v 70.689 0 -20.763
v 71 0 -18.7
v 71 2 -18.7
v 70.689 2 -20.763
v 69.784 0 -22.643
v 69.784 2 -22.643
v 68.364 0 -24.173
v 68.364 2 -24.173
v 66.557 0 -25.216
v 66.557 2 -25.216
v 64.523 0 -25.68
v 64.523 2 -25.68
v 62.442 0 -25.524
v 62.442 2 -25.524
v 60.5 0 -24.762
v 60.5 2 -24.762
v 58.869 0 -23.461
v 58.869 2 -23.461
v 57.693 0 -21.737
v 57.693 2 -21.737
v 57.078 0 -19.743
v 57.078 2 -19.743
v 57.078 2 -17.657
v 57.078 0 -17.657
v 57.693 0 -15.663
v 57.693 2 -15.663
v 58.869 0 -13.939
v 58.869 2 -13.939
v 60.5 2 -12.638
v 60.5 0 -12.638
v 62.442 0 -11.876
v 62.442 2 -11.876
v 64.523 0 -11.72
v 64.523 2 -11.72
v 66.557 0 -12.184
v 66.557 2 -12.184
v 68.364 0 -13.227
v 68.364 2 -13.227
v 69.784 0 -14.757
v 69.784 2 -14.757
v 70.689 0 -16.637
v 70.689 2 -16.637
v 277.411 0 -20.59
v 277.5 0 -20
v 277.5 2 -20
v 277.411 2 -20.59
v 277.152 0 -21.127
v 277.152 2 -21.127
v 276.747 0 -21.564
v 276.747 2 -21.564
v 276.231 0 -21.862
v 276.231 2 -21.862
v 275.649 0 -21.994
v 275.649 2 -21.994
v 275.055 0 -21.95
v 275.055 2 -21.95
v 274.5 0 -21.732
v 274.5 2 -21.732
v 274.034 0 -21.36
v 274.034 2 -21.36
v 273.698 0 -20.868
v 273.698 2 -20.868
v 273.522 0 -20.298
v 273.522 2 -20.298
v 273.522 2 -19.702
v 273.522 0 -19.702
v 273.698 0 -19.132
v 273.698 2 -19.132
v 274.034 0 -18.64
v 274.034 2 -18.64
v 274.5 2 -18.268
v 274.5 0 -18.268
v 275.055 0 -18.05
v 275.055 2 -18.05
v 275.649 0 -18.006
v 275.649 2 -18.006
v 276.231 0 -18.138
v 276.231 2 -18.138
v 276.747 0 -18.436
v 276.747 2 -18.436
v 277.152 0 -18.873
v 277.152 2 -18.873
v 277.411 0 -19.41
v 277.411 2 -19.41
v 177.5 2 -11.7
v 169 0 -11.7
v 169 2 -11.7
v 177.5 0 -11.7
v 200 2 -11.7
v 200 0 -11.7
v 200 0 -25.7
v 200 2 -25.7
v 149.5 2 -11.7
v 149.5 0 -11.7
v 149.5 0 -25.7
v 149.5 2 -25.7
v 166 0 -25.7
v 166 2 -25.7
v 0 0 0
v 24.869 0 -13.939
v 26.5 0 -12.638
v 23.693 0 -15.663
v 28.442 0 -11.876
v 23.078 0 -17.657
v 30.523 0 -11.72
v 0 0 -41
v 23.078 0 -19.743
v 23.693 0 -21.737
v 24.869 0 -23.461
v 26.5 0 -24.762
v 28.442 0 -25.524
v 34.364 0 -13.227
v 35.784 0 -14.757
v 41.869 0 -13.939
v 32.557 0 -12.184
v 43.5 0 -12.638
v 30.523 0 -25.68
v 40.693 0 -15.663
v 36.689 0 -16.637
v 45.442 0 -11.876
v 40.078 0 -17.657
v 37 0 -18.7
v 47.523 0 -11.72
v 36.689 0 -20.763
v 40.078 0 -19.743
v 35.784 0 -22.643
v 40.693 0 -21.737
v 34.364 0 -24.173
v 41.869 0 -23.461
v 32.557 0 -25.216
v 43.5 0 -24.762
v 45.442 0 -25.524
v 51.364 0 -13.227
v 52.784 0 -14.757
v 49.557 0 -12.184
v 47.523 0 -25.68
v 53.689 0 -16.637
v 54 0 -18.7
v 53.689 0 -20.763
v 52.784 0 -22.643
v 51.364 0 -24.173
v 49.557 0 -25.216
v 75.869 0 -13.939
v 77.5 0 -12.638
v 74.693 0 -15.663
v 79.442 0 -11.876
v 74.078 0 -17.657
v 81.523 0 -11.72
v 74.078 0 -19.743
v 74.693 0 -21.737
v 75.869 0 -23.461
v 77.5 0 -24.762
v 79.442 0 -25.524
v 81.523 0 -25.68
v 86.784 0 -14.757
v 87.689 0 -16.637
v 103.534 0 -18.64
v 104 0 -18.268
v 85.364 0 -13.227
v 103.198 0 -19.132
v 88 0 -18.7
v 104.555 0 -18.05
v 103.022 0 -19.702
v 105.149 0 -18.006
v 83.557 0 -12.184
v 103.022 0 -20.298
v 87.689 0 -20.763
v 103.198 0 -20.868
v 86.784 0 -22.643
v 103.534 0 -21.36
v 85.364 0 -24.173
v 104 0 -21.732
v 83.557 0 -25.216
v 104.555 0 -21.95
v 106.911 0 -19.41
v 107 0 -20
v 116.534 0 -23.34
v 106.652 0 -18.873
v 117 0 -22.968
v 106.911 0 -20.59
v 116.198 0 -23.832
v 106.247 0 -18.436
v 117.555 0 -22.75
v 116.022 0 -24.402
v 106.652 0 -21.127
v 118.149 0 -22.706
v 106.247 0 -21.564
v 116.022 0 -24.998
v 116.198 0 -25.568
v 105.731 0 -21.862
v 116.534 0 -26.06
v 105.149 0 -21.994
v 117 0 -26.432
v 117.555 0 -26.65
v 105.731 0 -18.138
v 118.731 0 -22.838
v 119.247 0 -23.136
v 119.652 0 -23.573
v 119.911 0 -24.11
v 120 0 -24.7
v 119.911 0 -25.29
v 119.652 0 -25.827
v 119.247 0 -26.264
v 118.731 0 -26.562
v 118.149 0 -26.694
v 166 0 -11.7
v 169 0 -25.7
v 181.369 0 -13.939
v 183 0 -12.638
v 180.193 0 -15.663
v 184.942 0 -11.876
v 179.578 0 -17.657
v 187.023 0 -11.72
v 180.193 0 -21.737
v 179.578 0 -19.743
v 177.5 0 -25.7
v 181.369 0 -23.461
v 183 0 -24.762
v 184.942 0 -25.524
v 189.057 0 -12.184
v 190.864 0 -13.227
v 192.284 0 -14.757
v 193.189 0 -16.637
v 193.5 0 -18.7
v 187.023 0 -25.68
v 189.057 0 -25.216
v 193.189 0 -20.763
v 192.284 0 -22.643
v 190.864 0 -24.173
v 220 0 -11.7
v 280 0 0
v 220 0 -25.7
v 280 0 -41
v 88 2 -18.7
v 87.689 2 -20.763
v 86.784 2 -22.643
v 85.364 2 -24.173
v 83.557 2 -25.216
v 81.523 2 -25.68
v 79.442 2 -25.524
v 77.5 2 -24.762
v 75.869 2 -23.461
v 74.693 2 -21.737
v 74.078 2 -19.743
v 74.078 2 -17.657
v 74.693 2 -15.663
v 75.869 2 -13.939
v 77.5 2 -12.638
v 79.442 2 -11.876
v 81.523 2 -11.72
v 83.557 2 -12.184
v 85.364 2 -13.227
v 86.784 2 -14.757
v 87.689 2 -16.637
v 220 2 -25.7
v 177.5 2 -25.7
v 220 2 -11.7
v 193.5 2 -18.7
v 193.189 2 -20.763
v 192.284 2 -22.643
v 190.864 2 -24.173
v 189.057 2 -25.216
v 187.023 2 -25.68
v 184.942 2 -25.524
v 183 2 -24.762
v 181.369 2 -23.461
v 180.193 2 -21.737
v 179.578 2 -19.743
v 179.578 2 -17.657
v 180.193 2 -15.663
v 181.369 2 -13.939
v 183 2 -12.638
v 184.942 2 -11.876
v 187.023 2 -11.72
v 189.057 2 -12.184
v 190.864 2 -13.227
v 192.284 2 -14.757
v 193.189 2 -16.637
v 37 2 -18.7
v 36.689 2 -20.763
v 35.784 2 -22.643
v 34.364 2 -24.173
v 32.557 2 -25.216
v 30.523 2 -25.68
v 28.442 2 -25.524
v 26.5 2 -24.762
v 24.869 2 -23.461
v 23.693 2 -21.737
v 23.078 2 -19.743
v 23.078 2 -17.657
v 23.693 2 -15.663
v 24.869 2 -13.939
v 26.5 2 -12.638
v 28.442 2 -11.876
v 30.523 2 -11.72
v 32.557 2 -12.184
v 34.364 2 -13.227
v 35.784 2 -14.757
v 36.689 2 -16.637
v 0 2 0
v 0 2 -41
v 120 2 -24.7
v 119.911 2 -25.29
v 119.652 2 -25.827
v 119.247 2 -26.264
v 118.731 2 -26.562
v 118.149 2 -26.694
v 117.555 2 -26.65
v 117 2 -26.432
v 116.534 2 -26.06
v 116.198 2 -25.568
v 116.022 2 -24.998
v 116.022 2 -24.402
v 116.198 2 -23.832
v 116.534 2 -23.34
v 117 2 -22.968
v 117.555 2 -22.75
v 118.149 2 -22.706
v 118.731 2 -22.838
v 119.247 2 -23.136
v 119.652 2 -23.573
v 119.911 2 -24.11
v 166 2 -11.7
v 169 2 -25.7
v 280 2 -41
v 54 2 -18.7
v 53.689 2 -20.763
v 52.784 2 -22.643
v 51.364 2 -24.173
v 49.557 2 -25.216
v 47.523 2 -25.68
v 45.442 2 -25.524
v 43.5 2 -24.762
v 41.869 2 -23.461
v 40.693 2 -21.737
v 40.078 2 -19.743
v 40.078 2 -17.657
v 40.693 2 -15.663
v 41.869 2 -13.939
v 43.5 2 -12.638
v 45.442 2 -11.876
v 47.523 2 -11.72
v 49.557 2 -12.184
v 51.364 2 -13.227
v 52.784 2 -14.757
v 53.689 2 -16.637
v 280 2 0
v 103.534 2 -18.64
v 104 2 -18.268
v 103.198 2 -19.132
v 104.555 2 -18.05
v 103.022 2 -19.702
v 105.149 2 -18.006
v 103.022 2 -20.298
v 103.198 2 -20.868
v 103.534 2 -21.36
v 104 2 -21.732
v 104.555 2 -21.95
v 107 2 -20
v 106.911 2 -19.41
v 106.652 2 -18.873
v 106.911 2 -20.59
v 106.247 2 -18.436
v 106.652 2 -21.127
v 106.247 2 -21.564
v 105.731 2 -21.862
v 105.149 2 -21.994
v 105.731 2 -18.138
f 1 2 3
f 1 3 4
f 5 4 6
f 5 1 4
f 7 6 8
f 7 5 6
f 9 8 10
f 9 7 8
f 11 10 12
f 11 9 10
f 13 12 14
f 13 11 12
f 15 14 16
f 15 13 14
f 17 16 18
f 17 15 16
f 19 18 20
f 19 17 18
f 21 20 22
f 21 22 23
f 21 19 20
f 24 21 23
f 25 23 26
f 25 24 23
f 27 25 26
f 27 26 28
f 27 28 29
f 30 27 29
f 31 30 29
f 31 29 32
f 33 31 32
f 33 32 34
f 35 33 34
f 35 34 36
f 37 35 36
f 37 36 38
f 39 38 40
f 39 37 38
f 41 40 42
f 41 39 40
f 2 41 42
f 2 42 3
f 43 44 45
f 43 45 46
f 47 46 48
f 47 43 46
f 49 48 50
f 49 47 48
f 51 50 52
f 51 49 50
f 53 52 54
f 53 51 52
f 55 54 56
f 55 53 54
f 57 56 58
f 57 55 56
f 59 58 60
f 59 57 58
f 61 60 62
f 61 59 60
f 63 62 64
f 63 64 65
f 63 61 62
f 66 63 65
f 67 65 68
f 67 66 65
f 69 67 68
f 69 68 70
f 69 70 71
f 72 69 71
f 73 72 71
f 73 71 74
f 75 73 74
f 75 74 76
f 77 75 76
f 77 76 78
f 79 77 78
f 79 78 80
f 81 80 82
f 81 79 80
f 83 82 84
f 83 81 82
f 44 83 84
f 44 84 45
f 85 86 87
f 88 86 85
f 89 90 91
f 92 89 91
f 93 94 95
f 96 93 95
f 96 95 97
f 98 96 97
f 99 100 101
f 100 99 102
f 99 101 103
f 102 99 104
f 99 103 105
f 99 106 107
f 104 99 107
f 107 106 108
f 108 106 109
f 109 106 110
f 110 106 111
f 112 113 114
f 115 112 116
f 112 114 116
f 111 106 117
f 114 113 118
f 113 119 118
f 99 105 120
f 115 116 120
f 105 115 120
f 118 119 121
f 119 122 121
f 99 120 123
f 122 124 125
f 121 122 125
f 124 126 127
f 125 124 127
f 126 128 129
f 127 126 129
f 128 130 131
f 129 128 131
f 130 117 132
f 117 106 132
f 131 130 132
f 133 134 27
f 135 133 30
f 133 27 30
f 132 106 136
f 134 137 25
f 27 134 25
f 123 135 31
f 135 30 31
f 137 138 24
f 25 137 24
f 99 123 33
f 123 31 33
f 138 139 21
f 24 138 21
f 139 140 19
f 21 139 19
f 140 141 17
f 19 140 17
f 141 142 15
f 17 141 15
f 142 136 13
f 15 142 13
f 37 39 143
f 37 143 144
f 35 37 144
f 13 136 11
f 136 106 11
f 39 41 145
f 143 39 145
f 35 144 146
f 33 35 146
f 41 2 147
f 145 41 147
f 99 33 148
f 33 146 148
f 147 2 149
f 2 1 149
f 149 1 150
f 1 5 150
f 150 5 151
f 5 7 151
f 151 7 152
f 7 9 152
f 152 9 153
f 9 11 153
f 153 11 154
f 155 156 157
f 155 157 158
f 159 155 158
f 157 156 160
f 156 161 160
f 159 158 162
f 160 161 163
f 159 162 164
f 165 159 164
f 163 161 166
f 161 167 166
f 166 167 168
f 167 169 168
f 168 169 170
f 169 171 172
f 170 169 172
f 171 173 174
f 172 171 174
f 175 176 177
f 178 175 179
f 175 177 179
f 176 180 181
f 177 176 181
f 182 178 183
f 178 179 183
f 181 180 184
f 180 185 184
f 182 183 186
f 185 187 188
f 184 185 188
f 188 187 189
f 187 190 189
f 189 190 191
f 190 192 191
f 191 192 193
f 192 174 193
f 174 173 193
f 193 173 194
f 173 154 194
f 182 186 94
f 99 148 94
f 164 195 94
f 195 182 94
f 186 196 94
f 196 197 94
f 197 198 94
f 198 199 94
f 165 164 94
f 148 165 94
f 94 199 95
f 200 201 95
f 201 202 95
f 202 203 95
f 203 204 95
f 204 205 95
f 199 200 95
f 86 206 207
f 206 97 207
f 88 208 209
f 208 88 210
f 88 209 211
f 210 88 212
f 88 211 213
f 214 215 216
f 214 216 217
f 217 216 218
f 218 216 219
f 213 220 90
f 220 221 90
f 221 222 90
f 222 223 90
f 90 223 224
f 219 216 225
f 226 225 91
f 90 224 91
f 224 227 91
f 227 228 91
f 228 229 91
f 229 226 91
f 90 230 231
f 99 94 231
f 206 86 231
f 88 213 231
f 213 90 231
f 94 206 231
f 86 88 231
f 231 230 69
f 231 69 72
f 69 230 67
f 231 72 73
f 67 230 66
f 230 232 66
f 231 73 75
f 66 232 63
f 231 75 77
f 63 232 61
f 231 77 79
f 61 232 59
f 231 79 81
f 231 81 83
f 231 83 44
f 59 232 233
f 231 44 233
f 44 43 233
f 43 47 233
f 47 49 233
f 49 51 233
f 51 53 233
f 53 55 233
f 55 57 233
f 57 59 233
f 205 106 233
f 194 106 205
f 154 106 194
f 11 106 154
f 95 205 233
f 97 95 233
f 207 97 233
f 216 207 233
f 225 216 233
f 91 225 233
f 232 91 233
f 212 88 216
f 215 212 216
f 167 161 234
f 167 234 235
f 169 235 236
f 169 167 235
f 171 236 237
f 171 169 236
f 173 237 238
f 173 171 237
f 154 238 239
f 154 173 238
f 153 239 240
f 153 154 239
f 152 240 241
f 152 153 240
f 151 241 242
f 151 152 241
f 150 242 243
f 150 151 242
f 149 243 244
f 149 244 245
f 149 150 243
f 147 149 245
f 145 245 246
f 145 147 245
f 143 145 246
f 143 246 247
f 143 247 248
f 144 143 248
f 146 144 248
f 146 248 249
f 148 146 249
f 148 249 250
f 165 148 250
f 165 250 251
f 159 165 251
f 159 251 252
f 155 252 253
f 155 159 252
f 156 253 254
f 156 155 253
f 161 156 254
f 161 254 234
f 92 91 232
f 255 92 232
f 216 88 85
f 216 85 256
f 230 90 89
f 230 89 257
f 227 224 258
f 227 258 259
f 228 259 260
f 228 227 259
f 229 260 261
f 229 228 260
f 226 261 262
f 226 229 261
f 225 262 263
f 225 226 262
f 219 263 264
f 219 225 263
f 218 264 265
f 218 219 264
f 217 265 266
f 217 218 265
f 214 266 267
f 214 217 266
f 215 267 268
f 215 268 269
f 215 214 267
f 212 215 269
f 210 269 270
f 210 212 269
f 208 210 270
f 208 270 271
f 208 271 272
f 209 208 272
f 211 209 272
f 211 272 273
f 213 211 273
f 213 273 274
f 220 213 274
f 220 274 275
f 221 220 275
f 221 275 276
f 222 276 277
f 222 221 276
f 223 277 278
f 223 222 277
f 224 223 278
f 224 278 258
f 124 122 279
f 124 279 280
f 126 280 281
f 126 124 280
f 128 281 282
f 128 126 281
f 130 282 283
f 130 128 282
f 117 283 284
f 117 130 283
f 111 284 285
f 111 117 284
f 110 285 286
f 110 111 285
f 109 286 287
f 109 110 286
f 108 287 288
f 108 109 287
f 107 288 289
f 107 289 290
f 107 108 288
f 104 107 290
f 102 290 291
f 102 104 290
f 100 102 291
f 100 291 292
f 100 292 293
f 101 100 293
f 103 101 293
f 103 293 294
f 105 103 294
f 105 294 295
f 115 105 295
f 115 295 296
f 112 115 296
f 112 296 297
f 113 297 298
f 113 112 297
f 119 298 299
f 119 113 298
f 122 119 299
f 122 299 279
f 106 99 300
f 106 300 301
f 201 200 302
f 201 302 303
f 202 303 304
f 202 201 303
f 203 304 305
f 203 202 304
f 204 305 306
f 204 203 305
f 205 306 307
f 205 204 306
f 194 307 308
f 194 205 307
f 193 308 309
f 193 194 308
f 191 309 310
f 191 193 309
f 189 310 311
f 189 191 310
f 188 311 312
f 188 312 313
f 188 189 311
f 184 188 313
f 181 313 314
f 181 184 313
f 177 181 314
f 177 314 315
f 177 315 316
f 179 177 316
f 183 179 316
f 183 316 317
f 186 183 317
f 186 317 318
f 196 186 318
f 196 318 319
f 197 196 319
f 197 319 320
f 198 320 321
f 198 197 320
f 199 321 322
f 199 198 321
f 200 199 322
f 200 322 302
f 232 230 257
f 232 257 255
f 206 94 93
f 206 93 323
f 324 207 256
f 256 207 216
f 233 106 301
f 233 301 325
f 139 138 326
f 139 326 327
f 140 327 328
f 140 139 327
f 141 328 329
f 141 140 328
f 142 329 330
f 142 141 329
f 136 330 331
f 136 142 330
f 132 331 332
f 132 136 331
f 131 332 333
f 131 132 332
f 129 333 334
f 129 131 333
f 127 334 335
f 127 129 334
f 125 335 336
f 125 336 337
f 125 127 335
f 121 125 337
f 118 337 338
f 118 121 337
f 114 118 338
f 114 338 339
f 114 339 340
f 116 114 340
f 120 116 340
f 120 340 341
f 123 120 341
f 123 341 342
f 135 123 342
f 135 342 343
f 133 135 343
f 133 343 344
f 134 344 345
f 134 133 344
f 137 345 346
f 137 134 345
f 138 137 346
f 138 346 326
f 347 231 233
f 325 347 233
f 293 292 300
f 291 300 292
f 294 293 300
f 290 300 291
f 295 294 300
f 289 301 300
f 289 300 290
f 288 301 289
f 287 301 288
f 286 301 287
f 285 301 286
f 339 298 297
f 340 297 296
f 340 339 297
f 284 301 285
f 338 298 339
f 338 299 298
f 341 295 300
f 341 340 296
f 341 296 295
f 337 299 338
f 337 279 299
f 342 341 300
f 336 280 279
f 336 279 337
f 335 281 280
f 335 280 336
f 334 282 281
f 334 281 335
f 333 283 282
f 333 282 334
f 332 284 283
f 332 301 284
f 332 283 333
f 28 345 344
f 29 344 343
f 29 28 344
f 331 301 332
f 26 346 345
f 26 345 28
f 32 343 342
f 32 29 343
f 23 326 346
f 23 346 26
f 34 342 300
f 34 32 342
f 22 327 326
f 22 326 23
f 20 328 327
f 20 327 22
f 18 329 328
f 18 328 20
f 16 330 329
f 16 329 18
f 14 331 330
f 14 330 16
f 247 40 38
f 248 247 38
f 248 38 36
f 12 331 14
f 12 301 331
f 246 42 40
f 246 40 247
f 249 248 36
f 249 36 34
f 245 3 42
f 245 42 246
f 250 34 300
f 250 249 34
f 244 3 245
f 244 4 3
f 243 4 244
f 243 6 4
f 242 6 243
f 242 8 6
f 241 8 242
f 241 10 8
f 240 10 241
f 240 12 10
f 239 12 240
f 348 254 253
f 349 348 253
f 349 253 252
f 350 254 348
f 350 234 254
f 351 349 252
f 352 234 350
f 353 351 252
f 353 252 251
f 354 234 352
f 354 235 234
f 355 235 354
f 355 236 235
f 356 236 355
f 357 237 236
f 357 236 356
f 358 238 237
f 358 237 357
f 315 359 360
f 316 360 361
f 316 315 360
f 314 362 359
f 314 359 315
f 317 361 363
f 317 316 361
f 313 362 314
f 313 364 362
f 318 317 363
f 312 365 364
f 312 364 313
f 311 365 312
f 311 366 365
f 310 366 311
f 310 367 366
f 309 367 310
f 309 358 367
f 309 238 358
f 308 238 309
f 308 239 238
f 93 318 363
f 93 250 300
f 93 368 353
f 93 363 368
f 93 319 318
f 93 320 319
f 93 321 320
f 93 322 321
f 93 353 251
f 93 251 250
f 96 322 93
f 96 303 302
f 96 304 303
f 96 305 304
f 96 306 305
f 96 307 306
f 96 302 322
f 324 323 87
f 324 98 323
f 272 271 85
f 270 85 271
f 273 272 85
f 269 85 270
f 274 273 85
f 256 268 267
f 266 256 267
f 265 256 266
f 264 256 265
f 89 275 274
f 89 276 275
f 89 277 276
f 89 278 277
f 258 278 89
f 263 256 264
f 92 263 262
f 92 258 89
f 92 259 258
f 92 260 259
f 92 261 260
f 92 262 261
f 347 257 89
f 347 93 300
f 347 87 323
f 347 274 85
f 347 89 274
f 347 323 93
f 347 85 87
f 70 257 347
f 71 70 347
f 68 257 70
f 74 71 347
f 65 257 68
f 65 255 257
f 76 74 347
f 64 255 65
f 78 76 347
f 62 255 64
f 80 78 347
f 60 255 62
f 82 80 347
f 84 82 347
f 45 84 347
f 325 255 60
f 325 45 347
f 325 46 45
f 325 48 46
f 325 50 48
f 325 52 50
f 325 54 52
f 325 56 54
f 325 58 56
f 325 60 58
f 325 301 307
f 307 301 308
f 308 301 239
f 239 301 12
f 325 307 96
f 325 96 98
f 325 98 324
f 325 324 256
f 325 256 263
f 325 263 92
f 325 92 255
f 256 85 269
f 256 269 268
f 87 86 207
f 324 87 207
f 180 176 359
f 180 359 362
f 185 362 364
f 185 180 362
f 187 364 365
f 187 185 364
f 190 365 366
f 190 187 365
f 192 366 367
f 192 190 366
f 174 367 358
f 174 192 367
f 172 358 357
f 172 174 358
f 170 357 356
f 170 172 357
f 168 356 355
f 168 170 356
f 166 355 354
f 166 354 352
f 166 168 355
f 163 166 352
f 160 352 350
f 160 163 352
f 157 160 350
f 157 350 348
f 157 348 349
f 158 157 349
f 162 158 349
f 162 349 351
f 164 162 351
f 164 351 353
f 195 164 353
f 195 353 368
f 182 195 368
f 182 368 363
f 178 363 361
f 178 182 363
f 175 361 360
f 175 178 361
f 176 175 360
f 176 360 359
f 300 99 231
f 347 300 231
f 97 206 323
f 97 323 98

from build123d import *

# Parameters (mm, degrees)
SKETCH_1_W      = 280
SKETCH_1_H      = 41
SKETCH_1_R      = 7
SKETCH_1_R_2    = 2
SKETCH_1_W_2    = 16.5
SKETCH_1_H_2    = 14
SKETCH_1_W_3    = 8.5
SKETCH_1_W_4    = 20
EXTRUDE_1_DEPTH = 2


with BuildPart() as part:
    # 草图1 → 凸台-拉伸1 (new body)
    with BuildSketch(Plane(origin=(0, 0, 0), x_dir=(1, 0, 0), z_dir=(0, 1, 0))):
        with Locations((140, 20.5)):
            Rectangle(SKETCH_1_W, SKETCH_1_H)
        with Locations((30, 18.7)):
            Circle(SKETCH_1_R, mode=Mode.SUBTRACT)
        with Locations((47, 18.7)):
            Circle(SKETCH_1_R, mode=Mode.SUBTRACT)
        with Locations((64, 18.7)):
            Circle(SKETCH_1_R, mode=Mode.SUBTRACT)
        with Locations((81, 18.7)):
            Circle(SKETCH_1_R, mode=Mode.SUBTRACT)
        with Locations((186.5, 18.7)):
            Circle(SKETCH_1_R, mode=Mode.SUBTRACT)
        with Locations((118, 24.7)):
            Circle(SKETCH_1_R_2, mode=Mode.SUBTRACT)
        with Locations((105, 20)):
            Circle(SKETCH_1_R_2, mode=Mode.SUBTRACT)
        with Locations((275.5, 20)):
            Circle(SKETCH_1_R_2, mode=Mode.SUBTRACT)
        with Locations((157.75, 18.7)):
            Rectangle(SKETCH_1_W_2, SKETCH_1_H_2, mode=Mode.SUBTRACT)
        with Locations((173.25, 18.7)):
            Rectangle(SKETCH_1_W_3, SKETCH_1_H_2, mode=Mode.SUBTRACT)
        with Locations((210, 18.7)):
            Rectangle(SKETCH_1_W_4, SKETCH_1_H_2, mode=Mode.SUBTRACT)
    extrude(amount=EXTRUDE_1_DEPTH)


solid = part.part
